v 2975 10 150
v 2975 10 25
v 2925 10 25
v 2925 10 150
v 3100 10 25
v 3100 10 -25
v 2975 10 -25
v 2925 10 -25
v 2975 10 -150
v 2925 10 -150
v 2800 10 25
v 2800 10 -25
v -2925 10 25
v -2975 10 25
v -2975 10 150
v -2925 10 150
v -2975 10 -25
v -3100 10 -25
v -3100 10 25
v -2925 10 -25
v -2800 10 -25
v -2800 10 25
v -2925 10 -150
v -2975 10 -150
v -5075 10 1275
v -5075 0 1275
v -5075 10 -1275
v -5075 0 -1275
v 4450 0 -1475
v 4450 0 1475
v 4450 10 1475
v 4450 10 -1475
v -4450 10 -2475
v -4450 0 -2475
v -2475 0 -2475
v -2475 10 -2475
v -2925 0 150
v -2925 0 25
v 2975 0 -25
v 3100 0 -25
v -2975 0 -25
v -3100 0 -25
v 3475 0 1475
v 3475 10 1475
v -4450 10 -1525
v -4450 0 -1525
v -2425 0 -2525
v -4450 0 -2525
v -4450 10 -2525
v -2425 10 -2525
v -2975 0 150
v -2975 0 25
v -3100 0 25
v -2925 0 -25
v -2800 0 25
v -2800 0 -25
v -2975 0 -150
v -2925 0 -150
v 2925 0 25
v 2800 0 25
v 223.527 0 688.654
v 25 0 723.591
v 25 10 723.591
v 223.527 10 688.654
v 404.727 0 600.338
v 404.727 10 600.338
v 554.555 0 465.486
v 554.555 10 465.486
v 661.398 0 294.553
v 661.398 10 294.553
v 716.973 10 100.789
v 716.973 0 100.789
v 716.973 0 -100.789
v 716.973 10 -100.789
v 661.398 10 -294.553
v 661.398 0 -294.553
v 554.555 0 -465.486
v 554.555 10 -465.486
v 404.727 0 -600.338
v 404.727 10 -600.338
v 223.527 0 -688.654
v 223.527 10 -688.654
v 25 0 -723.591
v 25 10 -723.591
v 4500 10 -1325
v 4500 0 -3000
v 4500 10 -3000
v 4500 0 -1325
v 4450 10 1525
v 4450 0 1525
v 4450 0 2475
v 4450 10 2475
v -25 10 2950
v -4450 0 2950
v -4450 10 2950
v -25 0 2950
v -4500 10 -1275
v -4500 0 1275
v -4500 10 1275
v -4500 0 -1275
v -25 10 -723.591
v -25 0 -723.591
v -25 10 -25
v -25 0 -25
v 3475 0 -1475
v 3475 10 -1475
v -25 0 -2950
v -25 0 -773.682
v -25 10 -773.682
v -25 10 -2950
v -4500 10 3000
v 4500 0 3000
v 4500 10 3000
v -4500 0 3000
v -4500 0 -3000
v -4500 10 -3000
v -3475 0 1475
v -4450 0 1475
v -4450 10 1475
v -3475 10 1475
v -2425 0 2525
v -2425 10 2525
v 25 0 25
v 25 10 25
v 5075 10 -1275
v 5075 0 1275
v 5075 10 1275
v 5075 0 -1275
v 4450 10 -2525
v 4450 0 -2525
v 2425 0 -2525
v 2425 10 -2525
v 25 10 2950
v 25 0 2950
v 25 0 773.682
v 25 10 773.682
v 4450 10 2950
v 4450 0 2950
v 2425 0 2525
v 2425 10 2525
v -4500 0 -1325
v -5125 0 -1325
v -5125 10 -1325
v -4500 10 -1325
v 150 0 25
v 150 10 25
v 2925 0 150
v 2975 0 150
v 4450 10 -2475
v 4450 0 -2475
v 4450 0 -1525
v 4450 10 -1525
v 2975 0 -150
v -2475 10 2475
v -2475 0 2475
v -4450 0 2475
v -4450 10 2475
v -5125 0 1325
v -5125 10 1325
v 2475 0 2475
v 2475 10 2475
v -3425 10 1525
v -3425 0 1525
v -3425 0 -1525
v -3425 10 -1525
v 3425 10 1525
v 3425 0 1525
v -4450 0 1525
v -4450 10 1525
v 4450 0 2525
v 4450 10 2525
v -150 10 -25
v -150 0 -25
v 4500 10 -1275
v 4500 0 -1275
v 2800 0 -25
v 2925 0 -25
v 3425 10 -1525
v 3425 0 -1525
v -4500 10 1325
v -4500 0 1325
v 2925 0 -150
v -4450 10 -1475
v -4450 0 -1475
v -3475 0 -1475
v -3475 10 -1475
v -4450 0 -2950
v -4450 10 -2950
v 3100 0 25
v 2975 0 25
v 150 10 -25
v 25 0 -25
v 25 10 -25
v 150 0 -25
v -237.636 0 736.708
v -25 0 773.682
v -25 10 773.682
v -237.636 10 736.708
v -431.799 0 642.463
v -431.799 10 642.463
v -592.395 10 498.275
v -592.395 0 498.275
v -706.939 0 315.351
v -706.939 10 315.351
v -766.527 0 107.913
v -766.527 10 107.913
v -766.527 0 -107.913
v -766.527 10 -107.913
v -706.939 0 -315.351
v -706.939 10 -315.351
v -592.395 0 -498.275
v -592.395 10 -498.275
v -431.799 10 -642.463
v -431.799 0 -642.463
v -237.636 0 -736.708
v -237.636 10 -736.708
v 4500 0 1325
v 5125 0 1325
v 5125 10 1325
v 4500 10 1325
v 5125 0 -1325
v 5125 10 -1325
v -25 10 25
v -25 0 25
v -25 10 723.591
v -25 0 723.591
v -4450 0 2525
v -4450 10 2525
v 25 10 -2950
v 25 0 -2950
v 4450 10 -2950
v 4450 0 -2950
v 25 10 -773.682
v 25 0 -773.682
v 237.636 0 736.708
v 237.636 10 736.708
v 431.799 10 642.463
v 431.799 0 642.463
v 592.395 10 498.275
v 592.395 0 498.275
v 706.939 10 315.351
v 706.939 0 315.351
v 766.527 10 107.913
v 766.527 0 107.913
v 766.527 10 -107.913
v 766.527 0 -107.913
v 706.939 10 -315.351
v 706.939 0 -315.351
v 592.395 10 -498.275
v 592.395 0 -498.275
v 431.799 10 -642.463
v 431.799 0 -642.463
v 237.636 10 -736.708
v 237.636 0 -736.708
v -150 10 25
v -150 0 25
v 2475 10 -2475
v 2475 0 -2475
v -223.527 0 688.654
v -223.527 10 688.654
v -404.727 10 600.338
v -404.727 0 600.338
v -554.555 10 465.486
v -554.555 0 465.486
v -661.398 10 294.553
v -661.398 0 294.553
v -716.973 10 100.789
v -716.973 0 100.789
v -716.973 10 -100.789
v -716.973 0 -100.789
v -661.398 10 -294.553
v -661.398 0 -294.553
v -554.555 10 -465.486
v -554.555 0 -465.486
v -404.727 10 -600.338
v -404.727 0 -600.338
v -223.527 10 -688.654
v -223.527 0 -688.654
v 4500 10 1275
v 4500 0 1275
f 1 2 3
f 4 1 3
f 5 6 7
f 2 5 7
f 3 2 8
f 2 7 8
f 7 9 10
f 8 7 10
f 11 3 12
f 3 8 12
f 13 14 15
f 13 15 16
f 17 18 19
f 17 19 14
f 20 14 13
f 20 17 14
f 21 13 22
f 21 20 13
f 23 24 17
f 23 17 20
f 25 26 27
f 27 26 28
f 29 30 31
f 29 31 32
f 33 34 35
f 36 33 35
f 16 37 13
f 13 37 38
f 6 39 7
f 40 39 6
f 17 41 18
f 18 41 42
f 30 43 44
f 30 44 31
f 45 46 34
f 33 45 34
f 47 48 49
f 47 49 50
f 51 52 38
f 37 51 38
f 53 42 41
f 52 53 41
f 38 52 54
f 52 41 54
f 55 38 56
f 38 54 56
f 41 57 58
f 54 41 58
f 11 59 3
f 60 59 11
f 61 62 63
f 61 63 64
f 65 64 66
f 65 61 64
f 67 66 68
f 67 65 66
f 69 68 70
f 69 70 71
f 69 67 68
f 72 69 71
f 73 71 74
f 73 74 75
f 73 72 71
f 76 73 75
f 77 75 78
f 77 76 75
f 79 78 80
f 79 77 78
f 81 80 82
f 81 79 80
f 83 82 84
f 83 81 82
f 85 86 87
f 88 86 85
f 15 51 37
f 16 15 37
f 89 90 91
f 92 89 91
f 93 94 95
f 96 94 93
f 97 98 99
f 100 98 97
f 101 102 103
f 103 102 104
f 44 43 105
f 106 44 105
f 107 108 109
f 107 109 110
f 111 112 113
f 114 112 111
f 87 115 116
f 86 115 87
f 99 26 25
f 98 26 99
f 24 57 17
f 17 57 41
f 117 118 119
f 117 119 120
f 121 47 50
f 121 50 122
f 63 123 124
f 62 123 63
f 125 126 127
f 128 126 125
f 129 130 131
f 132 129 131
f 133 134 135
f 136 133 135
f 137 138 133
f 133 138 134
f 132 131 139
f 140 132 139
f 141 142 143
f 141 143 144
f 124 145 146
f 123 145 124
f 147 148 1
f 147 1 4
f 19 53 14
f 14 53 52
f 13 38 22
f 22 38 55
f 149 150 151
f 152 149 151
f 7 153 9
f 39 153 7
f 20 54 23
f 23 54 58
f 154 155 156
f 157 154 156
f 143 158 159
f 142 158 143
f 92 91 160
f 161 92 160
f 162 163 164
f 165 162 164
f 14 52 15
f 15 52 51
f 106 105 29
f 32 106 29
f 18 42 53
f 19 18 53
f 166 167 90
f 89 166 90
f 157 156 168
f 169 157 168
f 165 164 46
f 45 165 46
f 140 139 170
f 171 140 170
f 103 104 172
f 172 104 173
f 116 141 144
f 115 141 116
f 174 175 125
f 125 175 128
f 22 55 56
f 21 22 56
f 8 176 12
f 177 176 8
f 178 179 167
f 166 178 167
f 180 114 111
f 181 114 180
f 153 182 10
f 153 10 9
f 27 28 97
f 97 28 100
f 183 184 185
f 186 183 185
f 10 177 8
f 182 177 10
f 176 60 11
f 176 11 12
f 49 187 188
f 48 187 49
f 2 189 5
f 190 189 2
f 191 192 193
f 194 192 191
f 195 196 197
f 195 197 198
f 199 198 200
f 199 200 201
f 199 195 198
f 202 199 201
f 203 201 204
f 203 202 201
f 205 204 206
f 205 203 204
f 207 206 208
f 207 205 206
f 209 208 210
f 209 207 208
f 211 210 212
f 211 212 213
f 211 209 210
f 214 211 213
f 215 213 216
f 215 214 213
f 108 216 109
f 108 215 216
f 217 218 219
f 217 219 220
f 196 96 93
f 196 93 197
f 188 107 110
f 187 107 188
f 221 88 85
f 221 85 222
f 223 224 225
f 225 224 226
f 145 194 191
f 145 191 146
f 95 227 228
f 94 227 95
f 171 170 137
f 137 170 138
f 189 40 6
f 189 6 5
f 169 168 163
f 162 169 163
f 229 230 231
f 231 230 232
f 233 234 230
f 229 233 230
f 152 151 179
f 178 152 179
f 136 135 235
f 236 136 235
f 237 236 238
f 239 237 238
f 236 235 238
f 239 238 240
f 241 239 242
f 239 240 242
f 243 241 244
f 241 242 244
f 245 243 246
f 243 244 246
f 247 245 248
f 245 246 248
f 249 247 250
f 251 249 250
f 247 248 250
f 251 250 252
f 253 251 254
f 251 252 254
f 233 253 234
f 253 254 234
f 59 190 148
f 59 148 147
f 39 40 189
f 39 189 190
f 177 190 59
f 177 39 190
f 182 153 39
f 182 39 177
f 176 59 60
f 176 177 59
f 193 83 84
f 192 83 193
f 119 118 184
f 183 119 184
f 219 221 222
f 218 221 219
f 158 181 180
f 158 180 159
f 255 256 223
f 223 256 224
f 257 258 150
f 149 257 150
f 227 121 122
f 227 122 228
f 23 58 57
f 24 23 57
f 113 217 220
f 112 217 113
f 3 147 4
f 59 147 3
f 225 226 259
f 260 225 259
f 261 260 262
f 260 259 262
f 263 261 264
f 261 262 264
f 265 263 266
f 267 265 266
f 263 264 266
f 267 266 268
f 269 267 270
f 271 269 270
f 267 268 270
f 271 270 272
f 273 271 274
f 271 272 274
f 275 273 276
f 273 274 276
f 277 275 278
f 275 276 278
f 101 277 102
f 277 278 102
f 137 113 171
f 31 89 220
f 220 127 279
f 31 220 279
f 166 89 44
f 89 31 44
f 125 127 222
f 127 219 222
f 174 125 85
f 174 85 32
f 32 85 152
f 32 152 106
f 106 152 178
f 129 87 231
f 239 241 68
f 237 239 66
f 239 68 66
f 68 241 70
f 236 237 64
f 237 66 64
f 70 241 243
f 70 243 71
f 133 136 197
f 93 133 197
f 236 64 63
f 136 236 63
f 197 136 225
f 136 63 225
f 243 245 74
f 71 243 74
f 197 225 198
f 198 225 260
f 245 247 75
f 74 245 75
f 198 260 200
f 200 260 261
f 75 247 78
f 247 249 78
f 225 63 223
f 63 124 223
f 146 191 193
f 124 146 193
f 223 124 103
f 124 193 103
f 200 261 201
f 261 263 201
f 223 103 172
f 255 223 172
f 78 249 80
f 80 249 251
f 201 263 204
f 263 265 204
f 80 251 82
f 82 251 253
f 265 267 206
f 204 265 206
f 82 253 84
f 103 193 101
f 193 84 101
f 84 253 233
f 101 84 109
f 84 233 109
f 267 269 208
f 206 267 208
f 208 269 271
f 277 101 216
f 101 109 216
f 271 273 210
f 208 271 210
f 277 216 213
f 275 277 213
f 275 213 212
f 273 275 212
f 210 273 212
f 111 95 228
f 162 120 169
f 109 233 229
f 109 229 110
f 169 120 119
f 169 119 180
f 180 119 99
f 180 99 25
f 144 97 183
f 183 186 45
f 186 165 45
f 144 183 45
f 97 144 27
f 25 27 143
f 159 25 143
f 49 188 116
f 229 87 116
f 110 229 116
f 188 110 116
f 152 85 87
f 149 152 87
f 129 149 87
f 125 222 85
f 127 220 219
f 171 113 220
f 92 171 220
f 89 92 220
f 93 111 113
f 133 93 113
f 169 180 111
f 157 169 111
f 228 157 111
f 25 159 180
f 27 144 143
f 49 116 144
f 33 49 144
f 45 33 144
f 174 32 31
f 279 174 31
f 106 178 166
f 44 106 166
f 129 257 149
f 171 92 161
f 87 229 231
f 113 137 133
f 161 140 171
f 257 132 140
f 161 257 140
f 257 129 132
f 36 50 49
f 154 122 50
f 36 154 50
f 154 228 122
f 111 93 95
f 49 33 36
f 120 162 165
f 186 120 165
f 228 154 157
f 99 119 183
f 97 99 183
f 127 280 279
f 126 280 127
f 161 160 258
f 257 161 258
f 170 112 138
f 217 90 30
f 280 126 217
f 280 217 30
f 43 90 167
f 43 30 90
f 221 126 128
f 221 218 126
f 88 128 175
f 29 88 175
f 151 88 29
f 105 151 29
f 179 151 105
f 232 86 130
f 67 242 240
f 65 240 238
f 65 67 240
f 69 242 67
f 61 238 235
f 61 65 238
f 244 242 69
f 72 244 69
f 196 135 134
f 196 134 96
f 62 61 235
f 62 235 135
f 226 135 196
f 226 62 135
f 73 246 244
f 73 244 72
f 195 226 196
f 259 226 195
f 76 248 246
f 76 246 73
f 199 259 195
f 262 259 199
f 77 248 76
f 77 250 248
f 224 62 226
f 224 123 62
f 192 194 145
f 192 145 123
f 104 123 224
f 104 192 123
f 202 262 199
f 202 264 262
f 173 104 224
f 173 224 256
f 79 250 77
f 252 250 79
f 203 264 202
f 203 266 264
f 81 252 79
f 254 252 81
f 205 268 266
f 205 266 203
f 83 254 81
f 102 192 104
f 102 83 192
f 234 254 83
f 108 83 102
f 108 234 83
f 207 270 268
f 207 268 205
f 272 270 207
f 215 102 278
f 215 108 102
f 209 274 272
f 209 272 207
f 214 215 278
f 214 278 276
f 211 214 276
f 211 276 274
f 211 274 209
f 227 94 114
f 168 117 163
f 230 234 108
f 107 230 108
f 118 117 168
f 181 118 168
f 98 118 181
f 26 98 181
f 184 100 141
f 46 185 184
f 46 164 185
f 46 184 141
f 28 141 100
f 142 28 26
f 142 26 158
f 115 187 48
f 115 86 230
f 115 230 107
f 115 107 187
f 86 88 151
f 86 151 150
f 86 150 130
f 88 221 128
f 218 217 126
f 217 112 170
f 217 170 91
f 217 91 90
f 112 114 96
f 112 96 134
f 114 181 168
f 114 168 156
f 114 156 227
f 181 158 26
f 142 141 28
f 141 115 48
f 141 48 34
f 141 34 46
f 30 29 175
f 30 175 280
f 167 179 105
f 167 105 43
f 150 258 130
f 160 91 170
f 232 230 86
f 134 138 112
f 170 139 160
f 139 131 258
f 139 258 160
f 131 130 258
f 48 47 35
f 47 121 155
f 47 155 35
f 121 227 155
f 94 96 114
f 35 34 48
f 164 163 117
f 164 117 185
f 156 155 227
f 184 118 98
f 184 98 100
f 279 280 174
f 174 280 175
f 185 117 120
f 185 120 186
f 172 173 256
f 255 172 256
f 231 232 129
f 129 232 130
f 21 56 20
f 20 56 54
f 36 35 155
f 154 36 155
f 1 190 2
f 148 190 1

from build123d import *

# Parameters (mm, degrees)
SKETCH1_W             = 975
SKETCH1_H             = 2950
SKETCH1_W_2           = 575
SKETCH1_H_2           = 2550
BOSS_EXTRUDE2_DEPTH   = 10
BOSS_EXTRUDE2_2_DEPTH = 10
BOSS_EXTRUDE2_3_DEPTH = 10


with BuildPart() as part:
    # Sketch1 → Boss-Extrude2 (new body)
    with BuildSketch(Plane(origin=(0, 0, 0), x_dir=(1, 0, 0), z_dir=(0, 1, 0))):
        Polygon((-4500, 3000), (4500, 3000), (4500, 1325), (5125, 1325), (5125, -1325), (4500, -1325), (4500, -3000), (-4500, -3000), (-4500, -1325), (-5125, -1325), (-5125, 1325), (-4500, 1325), align=None)
        with BuildLine():
            Line((-4450, 2950), (-4450, 2525))
            Line((-4450, 2525), (-2425, 2525))
            Line((-2425, 2525), (-2425, -2525))
            Line((-2425, -2525), (-4450, -2525))
            Line((-4450, -2525), (-4450, -2950))
            Line((-4450, -2950), (-25, -2950))
            Line((-25, -2950), (-25, -773.682215065))
            ThreePointArc((-25, -773.682215065), (-774.086022292, 0), (-25, 773.682215065))
            Line((-25, 773.682215065), (-25, 2950))
            Line((-25, 2950), (-4450, 2950))
        make_face(mode=Mode.SUBTRACT)
        with BuildLine():
            Line((4450, 2950), (4450, 2525))
            Line((4450, 2525), (2425, 2525))
            Line((2425, 2525), (2425, -2525))
            Line((2425, -2525), (4450, -2525))
            Line((4450, -2525), (4450, -2950))
            Line((4450, -2950), (25, -2950))
            Line((25, -2950), (25, -773.682215065))
            ThreePointArc((25, -773.682215065), (774.086022292, 0), (25, 773.682215065))
            Line((25, 773.682215065), (25, 2950))
            Line((25, 2950), (4450, 2950))
        make_face(mode=Mode.SUBTRACT)
        with BuildLine():
            Line((-25, 723.591162127), (-25, 25))
            Line((-25, 25), (-150, 25))
            Line((-150, 25), (-150, -25))
            Line((-150, -25), (-25, -25))
            Line((-25, -25), (-25, -723.591162127))
            ThreePointArc((-25, -723.591162127), (-724.022907033, 0), (-25, 723.591162127))
        make_face(mode=Mode.SUBTRACT)
        with BuildLine():
            Line((25, 723.591162127), (25, 25))
            Line((25, 25), (150, 25))
            Line((150, 25), (150, -25))
            Line((150, -25), (25, -25))
            Line((25, -25), (25, -723.591162127))
            ThreePointArc((25, -723.591162127), (724.022907033, 0), (25, 723.591162127))
        make_face(mode=Mode.SUBTRACT)
        with Locations((-3962.5, 0)):
            Rectangle(SKETCH1_W, SKETCH1_H, mode=Mode.SUBTRACT)
        Polygon((-4450, 2475), (-2475, 2475), (-2475, -2475), (-4450, -2475), (-4450, -1525), (-3425, -1525), (-3425, 1525), (-4450, 1525), align=None, mode=Mode.SUBTRACT)
        with Locations((-4787.5, 0)):
            Rectangle(SKETCH1_W_2, SKETCH1_H_2, mode=Mode.SUBTRACT)
        with Locations((4787.5, 0)):
            Rectangle(SKETCH1_W_2, SKETCH1_H_2, mode=Mode.SUBTRACT)
        Polygon((3425, -1525), (4450, -1525), (4450, -2475), (2475, -2475), (2475, 2475), (4450, 2475), (4450, 1525), (3425, 1525), align=None, mode=Mode.SUBTRACT)
        with Locations((3962.5, 0)):
            Rectangle(SKETCH1_W, SKETCH1_H, mode=Mode.SUBTRACT)
    extrude(amount=BOSS_EXTRUDE2_DEPTH)


with BuildPart() as body_2:
    # Sketch1 → Boss-Extrude2 2 (new body)
    with BuildSketch(Plane(origin=(0, 0, 0), x_dir=(1, 0, 0), z_dir=(0, 1, 0))):
        Polygon((-2975, 150), (-2975, 25), (-3100, 25), (-3100, -25), (-2975, -25), (-2975, -150), (-2925, -150), (-2925, -25), (-2800, -25), (-2800, 25), (-2925, 25), (-2925, 150), align=None)
    extrude(amount=BOSS_EXTRUDE2_2_DEPTH)


with BuildPart() as body_3:
    # Sketch1 → Boss-Extrude2 3 (new body)
    with BuildSketch(Plane(origin=(0, 0, 0), x_dir=(1, 0, 0), z_dir=(0, 1, 0))):
        Polygon((2925, -25), (2800, -25), (2800, 25), (2925, 25), (2925, 150), (2975, 150), (2975, 25), (3100, 25), (3100, -25), (2975, -25), (2975, -150), (2925, -150), align=None)
    extrude(amount=BOSS_EXTRUDE2_3_DEPTH)


solid = Compound([part.part, body_2.part, body_3.part])
